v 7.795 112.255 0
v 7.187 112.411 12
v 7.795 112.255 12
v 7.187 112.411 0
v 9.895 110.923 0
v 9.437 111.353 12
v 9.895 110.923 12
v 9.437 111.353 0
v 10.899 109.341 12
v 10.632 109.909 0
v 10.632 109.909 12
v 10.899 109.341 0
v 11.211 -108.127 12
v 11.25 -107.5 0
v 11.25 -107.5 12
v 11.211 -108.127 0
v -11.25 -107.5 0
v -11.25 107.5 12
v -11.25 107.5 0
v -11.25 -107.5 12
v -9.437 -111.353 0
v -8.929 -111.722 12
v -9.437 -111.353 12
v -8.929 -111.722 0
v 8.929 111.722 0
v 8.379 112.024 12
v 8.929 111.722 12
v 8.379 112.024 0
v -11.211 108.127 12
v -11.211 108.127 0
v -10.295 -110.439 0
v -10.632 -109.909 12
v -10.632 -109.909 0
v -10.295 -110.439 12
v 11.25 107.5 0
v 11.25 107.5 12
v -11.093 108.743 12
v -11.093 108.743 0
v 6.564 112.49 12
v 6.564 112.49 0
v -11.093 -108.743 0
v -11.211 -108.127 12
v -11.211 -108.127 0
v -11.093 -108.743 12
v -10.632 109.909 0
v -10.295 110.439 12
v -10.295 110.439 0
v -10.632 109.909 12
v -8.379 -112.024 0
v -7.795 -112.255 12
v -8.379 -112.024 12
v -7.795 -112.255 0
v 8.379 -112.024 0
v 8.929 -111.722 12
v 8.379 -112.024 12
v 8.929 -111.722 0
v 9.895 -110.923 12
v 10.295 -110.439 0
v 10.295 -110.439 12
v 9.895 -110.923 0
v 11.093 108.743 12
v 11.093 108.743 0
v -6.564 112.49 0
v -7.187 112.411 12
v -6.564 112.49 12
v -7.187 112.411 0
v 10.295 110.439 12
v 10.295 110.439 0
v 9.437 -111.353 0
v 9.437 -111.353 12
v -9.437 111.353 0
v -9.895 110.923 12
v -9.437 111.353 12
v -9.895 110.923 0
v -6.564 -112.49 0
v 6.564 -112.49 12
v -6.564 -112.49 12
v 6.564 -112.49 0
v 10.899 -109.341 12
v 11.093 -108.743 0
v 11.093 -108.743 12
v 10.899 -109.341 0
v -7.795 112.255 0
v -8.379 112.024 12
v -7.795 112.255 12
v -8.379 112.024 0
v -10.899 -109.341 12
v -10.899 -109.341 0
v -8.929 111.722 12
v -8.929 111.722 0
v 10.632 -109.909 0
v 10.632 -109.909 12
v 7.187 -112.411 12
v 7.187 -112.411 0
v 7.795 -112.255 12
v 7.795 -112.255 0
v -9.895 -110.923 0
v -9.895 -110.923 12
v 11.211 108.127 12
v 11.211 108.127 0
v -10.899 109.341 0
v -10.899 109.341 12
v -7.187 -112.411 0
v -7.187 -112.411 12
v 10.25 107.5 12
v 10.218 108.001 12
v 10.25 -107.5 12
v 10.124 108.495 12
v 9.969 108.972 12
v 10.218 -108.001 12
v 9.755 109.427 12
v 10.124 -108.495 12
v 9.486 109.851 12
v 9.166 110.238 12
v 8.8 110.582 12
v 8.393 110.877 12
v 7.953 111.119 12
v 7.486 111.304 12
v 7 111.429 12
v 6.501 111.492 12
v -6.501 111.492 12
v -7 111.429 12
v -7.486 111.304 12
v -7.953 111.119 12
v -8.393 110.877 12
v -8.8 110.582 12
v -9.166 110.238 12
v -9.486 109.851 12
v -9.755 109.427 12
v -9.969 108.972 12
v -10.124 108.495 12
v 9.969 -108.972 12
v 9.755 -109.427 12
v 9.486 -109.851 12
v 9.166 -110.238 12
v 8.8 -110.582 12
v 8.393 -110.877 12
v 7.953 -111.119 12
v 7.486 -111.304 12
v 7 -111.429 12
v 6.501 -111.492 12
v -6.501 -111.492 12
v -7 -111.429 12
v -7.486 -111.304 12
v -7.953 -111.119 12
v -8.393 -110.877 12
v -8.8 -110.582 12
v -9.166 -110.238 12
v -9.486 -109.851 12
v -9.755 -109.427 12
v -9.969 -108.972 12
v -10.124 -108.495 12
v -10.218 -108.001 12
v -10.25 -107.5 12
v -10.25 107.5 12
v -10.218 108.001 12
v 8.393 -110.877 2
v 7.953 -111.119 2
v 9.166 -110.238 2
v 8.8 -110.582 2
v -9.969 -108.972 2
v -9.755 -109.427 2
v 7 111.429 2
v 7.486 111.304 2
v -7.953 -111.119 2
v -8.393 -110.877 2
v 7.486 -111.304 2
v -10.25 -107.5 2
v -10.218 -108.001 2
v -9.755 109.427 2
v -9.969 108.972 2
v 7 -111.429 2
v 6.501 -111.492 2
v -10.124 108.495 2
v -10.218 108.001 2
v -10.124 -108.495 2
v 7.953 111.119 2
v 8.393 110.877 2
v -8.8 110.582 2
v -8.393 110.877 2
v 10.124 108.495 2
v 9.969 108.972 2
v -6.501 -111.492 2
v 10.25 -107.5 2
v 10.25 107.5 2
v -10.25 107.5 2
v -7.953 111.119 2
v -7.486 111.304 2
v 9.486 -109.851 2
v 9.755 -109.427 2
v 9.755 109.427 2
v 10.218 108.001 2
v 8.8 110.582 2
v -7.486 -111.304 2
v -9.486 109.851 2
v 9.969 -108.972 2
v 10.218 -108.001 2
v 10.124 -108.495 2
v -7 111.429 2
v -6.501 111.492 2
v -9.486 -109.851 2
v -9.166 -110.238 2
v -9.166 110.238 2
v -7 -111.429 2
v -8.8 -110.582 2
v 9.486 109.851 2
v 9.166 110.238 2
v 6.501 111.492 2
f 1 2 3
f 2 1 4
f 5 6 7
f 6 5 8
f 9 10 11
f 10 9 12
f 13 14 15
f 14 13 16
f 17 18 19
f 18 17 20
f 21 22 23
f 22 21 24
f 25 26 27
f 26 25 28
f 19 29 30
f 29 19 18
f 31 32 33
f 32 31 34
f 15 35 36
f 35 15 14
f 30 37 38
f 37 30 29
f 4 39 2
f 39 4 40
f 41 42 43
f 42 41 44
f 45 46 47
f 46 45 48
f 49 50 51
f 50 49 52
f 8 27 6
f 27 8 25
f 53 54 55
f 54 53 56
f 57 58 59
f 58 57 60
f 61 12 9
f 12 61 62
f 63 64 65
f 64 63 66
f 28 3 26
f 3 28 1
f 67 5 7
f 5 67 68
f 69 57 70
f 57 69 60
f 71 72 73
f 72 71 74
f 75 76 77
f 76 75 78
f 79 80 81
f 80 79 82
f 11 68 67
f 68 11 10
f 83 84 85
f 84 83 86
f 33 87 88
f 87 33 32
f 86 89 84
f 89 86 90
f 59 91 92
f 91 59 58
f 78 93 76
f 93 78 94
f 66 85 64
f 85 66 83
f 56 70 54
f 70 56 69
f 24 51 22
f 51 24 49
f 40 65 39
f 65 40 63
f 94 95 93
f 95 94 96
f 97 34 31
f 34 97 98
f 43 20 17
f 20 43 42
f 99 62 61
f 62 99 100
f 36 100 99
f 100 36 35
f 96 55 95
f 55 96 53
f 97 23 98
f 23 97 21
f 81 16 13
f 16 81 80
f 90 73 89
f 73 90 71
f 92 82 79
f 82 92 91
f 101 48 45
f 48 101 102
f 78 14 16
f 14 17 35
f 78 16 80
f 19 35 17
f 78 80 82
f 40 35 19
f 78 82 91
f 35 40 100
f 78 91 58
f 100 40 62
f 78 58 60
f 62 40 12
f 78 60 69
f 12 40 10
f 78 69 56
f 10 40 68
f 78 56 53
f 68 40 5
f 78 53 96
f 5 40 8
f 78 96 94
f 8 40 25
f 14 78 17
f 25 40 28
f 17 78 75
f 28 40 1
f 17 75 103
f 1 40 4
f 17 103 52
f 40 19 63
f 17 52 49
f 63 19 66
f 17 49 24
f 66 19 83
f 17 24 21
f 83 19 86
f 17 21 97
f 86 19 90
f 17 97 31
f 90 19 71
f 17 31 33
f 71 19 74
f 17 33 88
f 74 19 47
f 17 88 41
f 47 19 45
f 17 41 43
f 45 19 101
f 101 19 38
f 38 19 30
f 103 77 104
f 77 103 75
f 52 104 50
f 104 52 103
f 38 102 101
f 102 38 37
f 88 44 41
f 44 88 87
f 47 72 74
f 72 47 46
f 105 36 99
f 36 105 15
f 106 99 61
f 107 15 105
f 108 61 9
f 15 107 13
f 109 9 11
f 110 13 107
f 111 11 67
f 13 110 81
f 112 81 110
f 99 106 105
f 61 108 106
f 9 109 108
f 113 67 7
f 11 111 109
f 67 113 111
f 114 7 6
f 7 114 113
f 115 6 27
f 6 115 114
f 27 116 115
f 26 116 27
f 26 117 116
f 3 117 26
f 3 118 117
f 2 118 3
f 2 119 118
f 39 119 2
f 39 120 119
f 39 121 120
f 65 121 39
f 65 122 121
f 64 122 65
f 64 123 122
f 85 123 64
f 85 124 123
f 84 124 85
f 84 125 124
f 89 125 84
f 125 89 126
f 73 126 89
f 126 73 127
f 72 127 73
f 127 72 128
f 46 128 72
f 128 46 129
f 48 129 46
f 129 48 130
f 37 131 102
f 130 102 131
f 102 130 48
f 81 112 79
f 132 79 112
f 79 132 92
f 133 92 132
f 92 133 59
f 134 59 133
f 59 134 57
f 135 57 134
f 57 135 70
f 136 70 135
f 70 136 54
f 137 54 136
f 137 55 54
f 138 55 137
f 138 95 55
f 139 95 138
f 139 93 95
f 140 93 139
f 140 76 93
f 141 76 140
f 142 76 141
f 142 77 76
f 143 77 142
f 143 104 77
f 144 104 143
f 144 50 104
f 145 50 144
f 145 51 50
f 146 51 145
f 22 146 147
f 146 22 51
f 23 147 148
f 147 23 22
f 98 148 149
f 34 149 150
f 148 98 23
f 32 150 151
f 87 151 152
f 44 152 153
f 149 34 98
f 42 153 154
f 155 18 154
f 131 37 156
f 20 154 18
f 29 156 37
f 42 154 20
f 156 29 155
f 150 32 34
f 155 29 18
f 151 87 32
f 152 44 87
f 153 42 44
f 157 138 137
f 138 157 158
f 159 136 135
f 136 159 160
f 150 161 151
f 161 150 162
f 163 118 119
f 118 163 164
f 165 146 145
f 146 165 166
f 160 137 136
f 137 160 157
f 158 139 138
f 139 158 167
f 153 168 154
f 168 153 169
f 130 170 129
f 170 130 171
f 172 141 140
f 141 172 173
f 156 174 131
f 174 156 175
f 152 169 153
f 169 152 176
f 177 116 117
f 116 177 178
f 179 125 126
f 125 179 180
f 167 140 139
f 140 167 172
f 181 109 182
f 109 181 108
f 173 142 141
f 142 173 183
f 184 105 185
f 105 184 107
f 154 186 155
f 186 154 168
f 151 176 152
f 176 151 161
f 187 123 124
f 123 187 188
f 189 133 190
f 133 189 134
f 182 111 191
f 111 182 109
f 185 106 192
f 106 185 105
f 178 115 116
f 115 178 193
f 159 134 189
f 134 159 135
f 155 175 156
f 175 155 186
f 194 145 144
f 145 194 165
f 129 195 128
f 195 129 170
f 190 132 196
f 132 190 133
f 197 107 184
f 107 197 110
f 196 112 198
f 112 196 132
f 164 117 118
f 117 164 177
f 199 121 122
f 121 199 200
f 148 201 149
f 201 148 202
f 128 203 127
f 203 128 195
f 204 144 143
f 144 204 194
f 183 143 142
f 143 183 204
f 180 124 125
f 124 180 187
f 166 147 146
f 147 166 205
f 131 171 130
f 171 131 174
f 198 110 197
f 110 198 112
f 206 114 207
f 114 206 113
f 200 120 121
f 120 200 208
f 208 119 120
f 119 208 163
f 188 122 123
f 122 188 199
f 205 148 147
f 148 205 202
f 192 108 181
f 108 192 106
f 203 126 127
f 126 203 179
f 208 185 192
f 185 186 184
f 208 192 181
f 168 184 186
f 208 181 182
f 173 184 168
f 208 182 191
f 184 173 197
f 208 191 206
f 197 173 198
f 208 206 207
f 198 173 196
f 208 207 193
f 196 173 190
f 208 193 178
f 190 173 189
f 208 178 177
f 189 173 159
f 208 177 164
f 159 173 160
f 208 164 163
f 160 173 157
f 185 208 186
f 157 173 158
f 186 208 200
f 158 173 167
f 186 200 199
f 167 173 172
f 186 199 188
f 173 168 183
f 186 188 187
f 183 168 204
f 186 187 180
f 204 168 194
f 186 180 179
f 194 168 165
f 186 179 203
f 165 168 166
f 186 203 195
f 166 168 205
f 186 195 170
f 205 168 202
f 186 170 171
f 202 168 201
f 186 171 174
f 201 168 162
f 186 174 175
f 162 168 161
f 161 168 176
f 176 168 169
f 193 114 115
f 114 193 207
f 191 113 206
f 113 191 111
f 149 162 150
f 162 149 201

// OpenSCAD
$fn = 50;


difference() {
	union() {
		hull() {
			translate(v = [-6.2500000000, 107.5000000000, 0]) {
				cylinder(h = 12, r = 5);
			}
			translate(v = [6.2500000000, 107.5000000000, 0]) {
				cylinder(h = 12, r = 5);
			}
			translate(v = [-6.2500000000, -107.5000000000, 0]) {
				cylinder(h = 12, r = 5);
			}
			translate(v = [6.2500000000, -107.5000000000, 0]) {
				cylinder(h = 12, r = 5);
			}
		}
	}
	union() {
		translate(v = [0, 0, 2]) {
			hull() {
				translate(v = [-6.2500000000, 107.5000000000, 0]) {
					cylinder(h = 10, r = 4);
				}
				translate(v = [6.2500000000, 107.5000000000, 0]) {
					cylinder(h = 10, r = 4);
				}
				translate(v = [-6.2500000000, -107.5000000000, 0]) {
					cylinder(h = 10, r = 4);
				}
				translate(v = [6.2500000000, -107.5000000000, 0]) {
					cylinder(h = 10, r = 4);
				}
			}
		}
	}
}
